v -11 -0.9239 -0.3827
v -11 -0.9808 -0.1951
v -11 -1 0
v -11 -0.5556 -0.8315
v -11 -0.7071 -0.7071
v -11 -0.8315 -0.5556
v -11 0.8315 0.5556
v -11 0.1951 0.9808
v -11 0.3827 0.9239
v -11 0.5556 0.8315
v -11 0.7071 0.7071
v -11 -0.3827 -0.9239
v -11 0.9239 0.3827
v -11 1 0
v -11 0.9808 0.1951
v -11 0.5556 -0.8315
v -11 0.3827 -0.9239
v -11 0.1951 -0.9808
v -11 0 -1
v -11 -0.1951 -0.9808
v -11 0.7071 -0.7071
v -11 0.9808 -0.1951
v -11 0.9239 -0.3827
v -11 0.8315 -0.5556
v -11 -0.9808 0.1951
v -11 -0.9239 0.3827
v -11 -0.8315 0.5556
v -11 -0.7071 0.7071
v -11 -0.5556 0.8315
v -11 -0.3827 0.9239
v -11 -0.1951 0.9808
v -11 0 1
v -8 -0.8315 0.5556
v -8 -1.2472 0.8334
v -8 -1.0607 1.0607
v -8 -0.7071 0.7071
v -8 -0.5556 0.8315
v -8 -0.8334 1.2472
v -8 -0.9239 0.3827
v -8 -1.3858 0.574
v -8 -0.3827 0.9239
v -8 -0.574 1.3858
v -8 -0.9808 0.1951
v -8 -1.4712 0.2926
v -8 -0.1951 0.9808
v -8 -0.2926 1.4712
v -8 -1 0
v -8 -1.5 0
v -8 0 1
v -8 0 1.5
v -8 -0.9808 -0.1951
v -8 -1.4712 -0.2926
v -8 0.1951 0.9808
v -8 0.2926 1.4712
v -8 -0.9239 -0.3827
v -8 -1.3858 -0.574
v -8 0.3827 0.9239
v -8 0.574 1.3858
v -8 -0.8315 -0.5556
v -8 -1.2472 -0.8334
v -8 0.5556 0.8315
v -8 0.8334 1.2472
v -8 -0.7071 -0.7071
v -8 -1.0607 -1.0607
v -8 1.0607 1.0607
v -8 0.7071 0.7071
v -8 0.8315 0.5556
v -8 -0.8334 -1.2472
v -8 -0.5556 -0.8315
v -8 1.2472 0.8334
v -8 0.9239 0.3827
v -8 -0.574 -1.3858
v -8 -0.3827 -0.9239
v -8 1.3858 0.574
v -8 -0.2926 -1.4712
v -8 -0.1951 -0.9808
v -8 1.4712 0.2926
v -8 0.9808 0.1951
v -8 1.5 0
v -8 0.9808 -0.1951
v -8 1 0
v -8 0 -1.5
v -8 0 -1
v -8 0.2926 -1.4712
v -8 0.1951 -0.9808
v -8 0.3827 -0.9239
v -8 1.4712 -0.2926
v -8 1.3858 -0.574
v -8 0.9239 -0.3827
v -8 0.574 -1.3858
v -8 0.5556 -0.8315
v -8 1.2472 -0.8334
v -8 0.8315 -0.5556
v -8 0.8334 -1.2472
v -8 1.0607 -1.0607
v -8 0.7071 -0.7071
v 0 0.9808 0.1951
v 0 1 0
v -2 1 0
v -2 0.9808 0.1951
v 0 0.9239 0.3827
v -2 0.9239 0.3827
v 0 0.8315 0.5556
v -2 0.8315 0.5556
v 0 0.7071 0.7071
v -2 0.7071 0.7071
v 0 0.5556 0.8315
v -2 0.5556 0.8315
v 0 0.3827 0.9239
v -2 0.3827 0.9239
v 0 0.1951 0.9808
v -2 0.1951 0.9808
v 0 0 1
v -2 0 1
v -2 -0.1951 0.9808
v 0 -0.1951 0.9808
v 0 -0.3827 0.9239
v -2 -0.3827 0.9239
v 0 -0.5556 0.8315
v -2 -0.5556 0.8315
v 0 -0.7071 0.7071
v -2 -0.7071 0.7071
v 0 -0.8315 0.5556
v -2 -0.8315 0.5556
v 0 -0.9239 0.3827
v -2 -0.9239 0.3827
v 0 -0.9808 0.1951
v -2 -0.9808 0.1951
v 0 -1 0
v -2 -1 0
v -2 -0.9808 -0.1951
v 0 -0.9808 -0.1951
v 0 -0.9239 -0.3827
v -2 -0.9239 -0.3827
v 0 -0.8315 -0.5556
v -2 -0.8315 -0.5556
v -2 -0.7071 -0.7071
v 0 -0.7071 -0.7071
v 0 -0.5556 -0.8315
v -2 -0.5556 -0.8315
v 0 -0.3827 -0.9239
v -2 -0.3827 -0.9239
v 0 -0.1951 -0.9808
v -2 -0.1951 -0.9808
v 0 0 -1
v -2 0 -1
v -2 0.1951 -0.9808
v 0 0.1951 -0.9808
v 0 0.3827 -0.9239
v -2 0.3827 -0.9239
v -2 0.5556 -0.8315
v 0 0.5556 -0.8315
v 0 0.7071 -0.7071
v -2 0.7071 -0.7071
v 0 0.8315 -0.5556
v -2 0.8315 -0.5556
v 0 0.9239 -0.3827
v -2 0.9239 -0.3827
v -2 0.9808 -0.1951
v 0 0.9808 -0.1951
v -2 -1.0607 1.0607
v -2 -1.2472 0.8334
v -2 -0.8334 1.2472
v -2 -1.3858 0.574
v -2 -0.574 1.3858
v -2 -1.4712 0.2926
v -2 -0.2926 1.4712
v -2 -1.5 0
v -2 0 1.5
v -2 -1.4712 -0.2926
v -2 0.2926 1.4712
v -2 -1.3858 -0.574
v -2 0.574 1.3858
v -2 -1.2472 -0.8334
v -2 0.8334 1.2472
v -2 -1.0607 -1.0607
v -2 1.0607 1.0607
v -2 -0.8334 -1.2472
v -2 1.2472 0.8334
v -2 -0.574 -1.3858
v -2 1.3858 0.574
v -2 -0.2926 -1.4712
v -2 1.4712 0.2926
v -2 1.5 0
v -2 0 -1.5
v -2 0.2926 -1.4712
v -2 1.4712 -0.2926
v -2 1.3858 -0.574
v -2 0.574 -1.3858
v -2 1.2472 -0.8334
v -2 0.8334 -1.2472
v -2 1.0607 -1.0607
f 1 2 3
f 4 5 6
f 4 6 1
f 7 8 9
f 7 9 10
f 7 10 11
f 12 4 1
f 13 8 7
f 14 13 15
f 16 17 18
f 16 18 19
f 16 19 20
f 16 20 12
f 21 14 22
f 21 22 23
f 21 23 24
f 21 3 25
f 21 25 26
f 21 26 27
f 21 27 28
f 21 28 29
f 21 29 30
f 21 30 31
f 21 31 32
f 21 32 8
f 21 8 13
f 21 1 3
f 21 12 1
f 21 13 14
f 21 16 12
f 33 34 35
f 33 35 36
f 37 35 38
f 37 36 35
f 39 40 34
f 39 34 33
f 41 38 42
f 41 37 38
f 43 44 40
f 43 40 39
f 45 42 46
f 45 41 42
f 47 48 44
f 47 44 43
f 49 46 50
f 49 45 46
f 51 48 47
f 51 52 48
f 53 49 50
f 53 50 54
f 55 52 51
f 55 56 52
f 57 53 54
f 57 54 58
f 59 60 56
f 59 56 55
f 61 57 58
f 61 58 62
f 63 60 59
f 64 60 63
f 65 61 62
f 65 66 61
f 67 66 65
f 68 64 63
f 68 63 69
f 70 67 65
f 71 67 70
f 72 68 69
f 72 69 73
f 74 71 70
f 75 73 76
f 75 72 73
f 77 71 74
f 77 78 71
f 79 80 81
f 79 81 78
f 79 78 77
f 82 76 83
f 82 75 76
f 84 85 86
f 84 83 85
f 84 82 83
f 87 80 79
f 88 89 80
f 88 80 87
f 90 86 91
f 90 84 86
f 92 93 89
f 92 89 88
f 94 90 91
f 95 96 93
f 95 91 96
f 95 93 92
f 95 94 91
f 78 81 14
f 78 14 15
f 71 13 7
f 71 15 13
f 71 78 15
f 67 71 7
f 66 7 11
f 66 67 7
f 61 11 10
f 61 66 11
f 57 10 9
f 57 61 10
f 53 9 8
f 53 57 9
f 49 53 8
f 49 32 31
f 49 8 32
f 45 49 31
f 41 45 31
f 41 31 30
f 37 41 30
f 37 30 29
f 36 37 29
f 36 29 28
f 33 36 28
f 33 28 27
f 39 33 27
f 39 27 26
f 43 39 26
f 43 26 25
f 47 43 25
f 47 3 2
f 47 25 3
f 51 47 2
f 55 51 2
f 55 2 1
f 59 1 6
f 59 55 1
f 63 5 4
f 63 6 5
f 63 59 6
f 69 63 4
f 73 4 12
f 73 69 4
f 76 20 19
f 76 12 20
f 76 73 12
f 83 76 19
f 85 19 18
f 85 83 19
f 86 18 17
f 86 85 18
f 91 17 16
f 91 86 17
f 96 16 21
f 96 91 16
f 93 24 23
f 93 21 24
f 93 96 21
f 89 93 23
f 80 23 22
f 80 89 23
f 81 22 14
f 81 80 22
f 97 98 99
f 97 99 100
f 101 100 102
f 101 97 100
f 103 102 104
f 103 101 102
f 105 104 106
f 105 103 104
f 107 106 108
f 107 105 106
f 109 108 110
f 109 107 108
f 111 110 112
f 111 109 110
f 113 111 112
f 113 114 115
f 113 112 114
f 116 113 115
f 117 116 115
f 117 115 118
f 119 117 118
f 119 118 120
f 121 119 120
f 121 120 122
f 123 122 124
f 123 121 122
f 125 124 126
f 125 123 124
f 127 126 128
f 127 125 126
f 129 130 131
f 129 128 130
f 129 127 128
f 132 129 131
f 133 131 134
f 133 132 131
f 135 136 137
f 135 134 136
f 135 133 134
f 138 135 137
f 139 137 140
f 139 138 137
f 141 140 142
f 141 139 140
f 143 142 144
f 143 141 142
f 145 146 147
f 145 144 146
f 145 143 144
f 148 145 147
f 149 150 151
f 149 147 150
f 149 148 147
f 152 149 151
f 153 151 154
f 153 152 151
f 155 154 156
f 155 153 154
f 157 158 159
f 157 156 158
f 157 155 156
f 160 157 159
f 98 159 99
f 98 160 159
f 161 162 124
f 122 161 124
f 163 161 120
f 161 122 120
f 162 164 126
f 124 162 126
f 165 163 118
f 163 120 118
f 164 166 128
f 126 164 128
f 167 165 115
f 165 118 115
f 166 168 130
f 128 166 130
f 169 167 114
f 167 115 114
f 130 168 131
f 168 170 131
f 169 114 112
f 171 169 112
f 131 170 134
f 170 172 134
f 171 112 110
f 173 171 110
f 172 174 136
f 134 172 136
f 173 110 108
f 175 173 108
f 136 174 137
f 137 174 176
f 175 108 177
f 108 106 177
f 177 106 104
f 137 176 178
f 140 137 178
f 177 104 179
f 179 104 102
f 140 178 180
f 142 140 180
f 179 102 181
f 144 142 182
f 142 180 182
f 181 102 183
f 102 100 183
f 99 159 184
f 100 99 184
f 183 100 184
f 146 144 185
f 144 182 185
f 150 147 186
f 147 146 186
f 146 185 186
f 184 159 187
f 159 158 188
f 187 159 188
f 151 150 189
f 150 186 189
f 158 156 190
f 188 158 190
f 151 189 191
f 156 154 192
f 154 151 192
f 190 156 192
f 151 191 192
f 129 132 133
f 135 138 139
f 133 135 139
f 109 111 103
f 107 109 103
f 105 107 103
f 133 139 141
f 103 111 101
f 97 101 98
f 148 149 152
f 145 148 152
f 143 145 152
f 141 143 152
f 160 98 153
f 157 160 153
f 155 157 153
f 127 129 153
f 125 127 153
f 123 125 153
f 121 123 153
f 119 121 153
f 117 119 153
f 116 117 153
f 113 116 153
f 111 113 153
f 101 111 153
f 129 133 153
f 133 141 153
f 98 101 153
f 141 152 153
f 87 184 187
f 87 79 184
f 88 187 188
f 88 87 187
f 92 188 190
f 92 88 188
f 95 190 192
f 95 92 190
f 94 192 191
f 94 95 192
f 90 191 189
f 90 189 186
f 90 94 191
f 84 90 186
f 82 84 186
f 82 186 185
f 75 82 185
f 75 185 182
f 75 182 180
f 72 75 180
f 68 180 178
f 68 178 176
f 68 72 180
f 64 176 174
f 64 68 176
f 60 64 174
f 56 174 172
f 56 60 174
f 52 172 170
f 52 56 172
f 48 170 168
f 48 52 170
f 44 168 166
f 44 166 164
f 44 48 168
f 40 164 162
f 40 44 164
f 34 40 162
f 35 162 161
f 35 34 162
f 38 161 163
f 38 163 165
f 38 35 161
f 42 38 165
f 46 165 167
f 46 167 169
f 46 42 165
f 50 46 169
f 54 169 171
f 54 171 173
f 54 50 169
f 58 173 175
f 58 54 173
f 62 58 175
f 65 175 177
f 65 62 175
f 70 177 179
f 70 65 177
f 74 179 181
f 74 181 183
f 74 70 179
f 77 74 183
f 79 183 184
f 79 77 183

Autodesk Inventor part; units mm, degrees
ref_plane "YZ Plane" through (0, 0, 0) normal (1, 0, 0) x (0, 1, 0)
ref_plane "XZ Plane" through (0, 0, 0) normal (0, 1, 0) x (-1, 0, 0)
ref_plane "XY Plane" through (0, 0, 0) normal (0, 0, 1) x (1, 0, 0)
sketch "Boceto1" plane through (0, 0, 0) normal (0, 0, 1) x (1, 0, 0)
  line L0 (0, 0) -> (-11, 0)
  line L1 (0, 0) -> (-11, 0)
  line L2 (-11, 0) -> (-11, 1)
  line L3 (0, 1) -> (0, 0)
  line L4 (-8, 0) -> (-2, 0)
  line L5 (-2, 0) -> (-2, 1.5)
  line L6 (-2, 1.5) -> (-8, 1.5)
  line L7 (-8, 1.5) -> (-8, 0)
  line L8 (-11, 1) -> (-8, 1)
  line L9 (-2, 1) -> (0, 1)
  dimension "d1" = 2
  dimension "d2" = 2
  dimension "d3" = 3
  dimension "d4" = 3
  dimension "d5" = 2
  dimension "d6" = 6
  dimension "d7" = 11
revolve "Revolución1" add sketch "Boceto1" angle 360 about axis through (0, 0, 0) along (-1, 0, 0)
thread "Rosca1" size "M2x0.4" class "6g" standard "ANSI Metric M Profile" length 7
thread "Rosca2" size "M2x0.4" class "6g" standard "ANSI Metric M Profile" length 7
properties part number "Hudson 1-64"
